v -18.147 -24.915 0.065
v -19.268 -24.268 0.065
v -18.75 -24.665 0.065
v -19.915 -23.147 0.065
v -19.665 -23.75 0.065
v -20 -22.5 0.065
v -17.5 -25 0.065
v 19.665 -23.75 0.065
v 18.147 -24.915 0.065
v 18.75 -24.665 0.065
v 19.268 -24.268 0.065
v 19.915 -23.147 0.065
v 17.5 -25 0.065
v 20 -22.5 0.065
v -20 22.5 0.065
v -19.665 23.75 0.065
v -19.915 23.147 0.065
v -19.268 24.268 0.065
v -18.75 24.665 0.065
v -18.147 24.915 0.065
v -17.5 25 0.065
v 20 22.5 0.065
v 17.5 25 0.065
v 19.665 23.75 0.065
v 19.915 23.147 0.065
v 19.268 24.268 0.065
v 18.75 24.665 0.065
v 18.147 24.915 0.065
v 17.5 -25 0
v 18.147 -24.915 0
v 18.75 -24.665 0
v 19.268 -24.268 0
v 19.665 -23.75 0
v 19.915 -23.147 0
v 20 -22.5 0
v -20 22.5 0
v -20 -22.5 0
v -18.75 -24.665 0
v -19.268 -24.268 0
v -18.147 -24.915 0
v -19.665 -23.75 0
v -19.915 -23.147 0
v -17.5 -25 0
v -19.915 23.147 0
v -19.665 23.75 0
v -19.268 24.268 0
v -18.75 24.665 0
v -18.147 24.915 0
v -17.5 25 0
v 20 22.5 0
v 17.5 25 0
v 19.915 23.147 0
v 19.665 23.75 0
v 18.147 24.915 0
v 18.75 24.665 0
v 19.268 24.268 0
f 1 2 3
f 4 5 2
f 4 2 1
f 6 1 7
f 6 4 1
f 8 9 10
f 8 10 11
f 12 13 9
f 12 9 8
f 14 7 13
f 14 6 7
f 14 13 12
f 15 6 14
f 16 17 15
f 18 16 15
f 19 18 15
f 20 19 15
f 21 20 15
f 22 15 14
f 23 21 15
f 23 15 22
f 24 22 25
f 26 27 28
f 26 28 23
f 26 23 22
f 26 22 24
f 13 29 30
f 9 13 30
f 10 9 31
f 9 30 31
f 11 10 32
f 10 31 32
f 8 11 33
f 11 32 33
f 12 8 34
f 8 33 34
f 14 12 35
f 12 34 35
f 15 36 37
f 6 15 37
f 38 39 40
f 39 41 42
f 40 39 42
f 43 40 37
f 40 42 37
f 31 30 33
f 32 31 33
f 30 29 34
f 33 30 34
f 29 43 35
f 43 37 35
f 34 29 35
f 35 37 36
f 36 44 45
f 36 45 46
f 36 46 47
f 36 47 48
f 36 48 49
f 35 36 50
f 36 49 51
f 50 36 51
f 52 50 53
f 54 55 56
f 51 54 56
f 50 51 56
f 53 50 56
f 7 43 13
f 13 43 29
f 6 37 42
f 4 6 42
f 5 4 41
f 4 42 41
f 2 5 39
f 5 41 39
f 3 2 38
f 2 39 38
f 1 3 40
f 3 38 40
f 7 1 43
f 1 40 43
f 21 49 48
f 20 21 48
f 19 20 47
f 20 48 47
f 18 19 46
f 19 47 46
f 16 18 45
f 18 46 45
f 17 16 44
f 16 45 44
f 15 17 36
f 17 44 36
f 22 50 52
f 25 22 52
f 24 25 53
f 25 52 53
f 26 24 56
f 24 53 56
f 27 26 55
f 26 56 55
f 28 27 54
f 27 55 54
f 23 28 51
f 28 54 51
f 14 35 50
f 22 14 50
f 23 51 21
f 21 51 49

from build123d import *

# Parameters (mm, degrees)
BOSS_EXTRUDE1_DEPTH = 0.065


with BuildPart() as part:
    # Sketch1 → Boss-Extrude1 (new body)
    with BuildSketch(Plane.XY):
        with BuildLine():
            Line((-5, -25), (5, -25))
            Line((5, -25), (17.5, -25))
            ThreePointArc((17.5, -25), (19.267766953, -24.267766953), (20, -22.5))
            Line((20, -22.5), (20, 22.5))
            ThreePointArc((20, 22.5), (19.267766953, 24.267766953), (17.5, 25))
            Line((17.5, 25), (0, 25))
            Line((0, 25), (-17.5, 25))
            ThreePointArc((-17.5, 25), (-19.267766953, 24.267766953), (-20, 22.5))
            Line((-20, 22.5), (-20, -22.5))
            ThreePointArc((-20, -22.5), (-19.267766953, -24.267766953), (-17.5, -25))
            Line((-17.5, -25), (-5, -25))
        make_face()
    extrude(amount=BOSS_EXTRUDE1_DEPTH)


solid = part.part
